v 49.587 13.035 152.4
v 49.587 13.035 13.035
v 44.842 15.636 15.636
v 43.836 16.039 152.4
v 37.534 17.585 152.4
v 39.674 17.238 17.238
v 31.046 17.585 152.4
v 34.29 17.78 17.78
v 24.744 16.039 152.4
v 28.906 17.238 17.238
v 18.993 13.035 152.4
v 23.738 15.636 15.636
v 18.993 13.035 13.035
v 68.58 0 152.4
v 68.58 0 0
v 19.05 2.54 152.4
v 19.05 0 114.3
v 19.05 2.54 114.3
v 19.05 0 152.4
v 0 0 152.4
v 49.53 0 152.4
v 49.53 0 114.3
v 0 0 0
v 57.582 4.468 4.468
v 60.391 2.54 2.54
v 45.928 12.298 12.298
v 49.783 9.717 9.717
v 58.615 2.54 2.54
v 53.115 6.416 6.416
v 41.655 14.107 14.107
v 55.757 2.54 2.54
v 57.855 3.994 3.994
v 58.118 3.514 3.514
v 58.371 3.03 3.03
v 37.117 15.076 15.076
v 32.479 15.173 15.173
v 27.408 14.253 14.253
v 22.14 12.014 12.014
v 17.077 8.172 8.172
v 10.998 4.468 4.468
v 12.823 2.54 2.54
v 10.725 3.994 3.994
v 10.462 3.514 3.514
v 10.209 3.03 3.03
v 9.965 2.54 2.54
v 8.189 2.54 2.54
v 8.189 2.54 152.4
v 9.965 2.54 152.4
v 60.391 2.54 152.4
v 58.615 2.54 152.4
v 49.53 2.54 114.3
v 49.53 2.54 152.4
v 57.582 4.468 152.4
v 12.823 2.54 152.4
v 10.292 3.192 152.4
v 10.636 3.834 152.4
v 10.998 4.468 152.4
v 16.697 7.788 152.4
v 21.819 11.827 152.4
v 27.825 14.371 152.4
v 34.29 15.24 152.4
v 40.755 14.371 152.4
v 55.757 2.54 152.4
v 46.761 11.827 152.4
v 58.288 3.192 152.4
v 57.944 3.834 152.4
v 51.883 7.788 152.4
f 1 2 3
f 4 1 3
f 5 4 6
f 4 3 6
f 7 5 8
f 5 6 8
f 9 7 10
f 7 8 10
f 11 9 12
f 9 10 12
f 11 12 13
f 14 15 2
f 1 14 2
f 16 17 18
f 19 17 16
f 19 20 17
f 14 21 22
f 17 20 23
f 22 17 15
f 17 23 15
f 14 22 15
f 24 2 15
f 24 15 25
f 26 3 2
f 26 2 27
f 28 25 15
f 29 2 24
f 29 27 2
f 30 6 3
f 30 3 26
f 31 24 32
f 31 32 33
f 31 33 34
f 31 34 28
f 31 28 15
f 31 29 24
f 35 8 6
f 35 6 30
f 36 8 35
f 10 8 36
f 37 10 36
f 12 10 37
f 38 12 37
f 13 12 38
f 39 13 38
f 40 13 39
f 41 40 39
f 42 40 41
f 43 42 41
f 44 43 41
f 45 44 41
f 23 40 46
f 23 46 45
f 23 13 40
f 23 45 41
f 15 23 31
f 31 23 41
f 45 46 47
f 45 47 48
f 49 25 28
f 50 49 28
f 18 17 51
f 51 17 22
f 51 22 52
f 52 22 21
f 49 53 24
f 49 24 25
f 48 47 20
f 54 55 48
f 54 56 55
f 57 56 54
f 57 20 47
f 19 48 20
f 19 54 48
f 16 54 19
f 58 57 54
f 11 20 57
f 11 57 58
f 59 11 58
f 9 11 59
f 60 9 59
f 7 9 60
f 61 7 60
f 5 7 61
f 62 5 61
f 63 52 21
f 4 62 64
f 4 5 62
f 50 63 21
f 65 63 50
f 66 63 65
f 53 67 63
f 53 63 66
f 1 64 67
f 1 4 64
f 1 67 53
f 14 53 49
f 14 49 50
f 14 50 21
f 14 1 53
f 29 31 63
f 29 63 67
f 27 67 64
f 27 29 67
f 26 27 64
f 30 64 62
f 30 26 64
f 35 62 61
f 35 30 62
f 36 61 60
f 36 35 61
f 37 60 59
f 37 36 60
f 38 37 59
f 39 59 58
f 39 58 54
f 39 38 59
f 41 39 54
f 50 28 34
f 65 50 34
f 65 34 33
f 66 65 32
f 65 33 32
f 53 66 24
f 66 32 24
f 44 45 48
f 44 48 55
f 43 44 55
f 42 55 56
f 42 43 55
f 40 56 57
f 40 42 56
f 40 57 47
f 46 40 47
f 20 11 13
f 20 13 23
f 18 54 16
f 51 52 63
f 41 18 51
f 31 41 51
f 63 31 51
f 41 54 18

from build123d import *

# Parameters (mm, degrees)
BOSS_EXTRUDE1_DEPTH = 152.4
CUT_EXTRUDE1_DEPTH  = 69.58
CUT_EXTRUDE2_REACH  = 19.78
SKETCH4_W           = 30.48
SKETCH4_H           = 38.1


with BuildPart() as part:
    # Sketch2 → Boss-Extrude1 (new body)
    with BuildSketch(Plane.XY):
        with BuildLine():
            Line((0, 0), (68.58, 0))
            Line((68.58, 0), (49.587320143, 13.03542143))
            ThreePointArc((49.587320143, 13.03542143), (34.29, 17.78), (18.992679857, 13.03542143))
            Line((18.992679857, 13.03542143), (0, 0))
        make_face()
        with BuildLine():
            Line((10.997802271, 4.46752515), (8.189387654, 2.54))
            Line((8.189387654, 2.54), (9.965035751, 2.54))
            ThreePointArc((9.965035751, 2.54), (10.461920618, 3.514209799), (10.997802271, 4.46752515))
        make_face(mode=Mode.SUBTRACT)
        with BuildLine():
            Line((57.582197729, 4.46752515), (60.390612346, 2.54))
            Line((60.390612346, 2.54), (58.614964249, 2.54))
            ThreePointArc((58.614964249, 2.54), (58.118079382, 3.514209799), (57.582197729, 4.46752515))
        make_face(mode=Mode.SUBTRACT)
        with BuildLine():
            Line((12.82308193, 2.54), (55.75691807, 2.54))
            ThreePointArc((55.75691807, 2.54), (34.29, 15.24), (12.82308193, 2.54))
        make_face(mode=Mode.SUBTRACT)
    extrude(amount=BOSS_EXTRUDE1_DEPTH)

    # Sketch3 → Cut-Extrude1 (cut, through all)
    with BuildSketch(Plane(origin=(0, 0, 0), x_dir=(0, 0, -1), z_dir=(1, 0, 0))):
        Polygon((-17.78, 17.78), (0, 0), (0, 17.78), align=None)
    extrude(amount=CUT_EXTRUDE1_DEPTH, mode=Mode.SUBTRACT)

    # Sketch4 → Cut-Extrude2 (cut, up to next)
    with BuildSketch(Plane.XZ, mode=Mode.PRIVATE) as cut_extrude2_sk1:
        with Locations((34.29, 133.35)):
            Rectangle(SKETCH4_W, SKETCH4_H)
    cut_extrude2_tool1 = extrude(cut_extrude2_sk1.sketch, amount=-CUT_EXTRUDE2_REACH, mode=Mode.PRIVATE) & part.part
    add(cut_extrude2_tool1.solids().sort_by_distance((34.29, 0, 133.35))[0], mode=Mode.SUBTRACT)


solid = part.part
